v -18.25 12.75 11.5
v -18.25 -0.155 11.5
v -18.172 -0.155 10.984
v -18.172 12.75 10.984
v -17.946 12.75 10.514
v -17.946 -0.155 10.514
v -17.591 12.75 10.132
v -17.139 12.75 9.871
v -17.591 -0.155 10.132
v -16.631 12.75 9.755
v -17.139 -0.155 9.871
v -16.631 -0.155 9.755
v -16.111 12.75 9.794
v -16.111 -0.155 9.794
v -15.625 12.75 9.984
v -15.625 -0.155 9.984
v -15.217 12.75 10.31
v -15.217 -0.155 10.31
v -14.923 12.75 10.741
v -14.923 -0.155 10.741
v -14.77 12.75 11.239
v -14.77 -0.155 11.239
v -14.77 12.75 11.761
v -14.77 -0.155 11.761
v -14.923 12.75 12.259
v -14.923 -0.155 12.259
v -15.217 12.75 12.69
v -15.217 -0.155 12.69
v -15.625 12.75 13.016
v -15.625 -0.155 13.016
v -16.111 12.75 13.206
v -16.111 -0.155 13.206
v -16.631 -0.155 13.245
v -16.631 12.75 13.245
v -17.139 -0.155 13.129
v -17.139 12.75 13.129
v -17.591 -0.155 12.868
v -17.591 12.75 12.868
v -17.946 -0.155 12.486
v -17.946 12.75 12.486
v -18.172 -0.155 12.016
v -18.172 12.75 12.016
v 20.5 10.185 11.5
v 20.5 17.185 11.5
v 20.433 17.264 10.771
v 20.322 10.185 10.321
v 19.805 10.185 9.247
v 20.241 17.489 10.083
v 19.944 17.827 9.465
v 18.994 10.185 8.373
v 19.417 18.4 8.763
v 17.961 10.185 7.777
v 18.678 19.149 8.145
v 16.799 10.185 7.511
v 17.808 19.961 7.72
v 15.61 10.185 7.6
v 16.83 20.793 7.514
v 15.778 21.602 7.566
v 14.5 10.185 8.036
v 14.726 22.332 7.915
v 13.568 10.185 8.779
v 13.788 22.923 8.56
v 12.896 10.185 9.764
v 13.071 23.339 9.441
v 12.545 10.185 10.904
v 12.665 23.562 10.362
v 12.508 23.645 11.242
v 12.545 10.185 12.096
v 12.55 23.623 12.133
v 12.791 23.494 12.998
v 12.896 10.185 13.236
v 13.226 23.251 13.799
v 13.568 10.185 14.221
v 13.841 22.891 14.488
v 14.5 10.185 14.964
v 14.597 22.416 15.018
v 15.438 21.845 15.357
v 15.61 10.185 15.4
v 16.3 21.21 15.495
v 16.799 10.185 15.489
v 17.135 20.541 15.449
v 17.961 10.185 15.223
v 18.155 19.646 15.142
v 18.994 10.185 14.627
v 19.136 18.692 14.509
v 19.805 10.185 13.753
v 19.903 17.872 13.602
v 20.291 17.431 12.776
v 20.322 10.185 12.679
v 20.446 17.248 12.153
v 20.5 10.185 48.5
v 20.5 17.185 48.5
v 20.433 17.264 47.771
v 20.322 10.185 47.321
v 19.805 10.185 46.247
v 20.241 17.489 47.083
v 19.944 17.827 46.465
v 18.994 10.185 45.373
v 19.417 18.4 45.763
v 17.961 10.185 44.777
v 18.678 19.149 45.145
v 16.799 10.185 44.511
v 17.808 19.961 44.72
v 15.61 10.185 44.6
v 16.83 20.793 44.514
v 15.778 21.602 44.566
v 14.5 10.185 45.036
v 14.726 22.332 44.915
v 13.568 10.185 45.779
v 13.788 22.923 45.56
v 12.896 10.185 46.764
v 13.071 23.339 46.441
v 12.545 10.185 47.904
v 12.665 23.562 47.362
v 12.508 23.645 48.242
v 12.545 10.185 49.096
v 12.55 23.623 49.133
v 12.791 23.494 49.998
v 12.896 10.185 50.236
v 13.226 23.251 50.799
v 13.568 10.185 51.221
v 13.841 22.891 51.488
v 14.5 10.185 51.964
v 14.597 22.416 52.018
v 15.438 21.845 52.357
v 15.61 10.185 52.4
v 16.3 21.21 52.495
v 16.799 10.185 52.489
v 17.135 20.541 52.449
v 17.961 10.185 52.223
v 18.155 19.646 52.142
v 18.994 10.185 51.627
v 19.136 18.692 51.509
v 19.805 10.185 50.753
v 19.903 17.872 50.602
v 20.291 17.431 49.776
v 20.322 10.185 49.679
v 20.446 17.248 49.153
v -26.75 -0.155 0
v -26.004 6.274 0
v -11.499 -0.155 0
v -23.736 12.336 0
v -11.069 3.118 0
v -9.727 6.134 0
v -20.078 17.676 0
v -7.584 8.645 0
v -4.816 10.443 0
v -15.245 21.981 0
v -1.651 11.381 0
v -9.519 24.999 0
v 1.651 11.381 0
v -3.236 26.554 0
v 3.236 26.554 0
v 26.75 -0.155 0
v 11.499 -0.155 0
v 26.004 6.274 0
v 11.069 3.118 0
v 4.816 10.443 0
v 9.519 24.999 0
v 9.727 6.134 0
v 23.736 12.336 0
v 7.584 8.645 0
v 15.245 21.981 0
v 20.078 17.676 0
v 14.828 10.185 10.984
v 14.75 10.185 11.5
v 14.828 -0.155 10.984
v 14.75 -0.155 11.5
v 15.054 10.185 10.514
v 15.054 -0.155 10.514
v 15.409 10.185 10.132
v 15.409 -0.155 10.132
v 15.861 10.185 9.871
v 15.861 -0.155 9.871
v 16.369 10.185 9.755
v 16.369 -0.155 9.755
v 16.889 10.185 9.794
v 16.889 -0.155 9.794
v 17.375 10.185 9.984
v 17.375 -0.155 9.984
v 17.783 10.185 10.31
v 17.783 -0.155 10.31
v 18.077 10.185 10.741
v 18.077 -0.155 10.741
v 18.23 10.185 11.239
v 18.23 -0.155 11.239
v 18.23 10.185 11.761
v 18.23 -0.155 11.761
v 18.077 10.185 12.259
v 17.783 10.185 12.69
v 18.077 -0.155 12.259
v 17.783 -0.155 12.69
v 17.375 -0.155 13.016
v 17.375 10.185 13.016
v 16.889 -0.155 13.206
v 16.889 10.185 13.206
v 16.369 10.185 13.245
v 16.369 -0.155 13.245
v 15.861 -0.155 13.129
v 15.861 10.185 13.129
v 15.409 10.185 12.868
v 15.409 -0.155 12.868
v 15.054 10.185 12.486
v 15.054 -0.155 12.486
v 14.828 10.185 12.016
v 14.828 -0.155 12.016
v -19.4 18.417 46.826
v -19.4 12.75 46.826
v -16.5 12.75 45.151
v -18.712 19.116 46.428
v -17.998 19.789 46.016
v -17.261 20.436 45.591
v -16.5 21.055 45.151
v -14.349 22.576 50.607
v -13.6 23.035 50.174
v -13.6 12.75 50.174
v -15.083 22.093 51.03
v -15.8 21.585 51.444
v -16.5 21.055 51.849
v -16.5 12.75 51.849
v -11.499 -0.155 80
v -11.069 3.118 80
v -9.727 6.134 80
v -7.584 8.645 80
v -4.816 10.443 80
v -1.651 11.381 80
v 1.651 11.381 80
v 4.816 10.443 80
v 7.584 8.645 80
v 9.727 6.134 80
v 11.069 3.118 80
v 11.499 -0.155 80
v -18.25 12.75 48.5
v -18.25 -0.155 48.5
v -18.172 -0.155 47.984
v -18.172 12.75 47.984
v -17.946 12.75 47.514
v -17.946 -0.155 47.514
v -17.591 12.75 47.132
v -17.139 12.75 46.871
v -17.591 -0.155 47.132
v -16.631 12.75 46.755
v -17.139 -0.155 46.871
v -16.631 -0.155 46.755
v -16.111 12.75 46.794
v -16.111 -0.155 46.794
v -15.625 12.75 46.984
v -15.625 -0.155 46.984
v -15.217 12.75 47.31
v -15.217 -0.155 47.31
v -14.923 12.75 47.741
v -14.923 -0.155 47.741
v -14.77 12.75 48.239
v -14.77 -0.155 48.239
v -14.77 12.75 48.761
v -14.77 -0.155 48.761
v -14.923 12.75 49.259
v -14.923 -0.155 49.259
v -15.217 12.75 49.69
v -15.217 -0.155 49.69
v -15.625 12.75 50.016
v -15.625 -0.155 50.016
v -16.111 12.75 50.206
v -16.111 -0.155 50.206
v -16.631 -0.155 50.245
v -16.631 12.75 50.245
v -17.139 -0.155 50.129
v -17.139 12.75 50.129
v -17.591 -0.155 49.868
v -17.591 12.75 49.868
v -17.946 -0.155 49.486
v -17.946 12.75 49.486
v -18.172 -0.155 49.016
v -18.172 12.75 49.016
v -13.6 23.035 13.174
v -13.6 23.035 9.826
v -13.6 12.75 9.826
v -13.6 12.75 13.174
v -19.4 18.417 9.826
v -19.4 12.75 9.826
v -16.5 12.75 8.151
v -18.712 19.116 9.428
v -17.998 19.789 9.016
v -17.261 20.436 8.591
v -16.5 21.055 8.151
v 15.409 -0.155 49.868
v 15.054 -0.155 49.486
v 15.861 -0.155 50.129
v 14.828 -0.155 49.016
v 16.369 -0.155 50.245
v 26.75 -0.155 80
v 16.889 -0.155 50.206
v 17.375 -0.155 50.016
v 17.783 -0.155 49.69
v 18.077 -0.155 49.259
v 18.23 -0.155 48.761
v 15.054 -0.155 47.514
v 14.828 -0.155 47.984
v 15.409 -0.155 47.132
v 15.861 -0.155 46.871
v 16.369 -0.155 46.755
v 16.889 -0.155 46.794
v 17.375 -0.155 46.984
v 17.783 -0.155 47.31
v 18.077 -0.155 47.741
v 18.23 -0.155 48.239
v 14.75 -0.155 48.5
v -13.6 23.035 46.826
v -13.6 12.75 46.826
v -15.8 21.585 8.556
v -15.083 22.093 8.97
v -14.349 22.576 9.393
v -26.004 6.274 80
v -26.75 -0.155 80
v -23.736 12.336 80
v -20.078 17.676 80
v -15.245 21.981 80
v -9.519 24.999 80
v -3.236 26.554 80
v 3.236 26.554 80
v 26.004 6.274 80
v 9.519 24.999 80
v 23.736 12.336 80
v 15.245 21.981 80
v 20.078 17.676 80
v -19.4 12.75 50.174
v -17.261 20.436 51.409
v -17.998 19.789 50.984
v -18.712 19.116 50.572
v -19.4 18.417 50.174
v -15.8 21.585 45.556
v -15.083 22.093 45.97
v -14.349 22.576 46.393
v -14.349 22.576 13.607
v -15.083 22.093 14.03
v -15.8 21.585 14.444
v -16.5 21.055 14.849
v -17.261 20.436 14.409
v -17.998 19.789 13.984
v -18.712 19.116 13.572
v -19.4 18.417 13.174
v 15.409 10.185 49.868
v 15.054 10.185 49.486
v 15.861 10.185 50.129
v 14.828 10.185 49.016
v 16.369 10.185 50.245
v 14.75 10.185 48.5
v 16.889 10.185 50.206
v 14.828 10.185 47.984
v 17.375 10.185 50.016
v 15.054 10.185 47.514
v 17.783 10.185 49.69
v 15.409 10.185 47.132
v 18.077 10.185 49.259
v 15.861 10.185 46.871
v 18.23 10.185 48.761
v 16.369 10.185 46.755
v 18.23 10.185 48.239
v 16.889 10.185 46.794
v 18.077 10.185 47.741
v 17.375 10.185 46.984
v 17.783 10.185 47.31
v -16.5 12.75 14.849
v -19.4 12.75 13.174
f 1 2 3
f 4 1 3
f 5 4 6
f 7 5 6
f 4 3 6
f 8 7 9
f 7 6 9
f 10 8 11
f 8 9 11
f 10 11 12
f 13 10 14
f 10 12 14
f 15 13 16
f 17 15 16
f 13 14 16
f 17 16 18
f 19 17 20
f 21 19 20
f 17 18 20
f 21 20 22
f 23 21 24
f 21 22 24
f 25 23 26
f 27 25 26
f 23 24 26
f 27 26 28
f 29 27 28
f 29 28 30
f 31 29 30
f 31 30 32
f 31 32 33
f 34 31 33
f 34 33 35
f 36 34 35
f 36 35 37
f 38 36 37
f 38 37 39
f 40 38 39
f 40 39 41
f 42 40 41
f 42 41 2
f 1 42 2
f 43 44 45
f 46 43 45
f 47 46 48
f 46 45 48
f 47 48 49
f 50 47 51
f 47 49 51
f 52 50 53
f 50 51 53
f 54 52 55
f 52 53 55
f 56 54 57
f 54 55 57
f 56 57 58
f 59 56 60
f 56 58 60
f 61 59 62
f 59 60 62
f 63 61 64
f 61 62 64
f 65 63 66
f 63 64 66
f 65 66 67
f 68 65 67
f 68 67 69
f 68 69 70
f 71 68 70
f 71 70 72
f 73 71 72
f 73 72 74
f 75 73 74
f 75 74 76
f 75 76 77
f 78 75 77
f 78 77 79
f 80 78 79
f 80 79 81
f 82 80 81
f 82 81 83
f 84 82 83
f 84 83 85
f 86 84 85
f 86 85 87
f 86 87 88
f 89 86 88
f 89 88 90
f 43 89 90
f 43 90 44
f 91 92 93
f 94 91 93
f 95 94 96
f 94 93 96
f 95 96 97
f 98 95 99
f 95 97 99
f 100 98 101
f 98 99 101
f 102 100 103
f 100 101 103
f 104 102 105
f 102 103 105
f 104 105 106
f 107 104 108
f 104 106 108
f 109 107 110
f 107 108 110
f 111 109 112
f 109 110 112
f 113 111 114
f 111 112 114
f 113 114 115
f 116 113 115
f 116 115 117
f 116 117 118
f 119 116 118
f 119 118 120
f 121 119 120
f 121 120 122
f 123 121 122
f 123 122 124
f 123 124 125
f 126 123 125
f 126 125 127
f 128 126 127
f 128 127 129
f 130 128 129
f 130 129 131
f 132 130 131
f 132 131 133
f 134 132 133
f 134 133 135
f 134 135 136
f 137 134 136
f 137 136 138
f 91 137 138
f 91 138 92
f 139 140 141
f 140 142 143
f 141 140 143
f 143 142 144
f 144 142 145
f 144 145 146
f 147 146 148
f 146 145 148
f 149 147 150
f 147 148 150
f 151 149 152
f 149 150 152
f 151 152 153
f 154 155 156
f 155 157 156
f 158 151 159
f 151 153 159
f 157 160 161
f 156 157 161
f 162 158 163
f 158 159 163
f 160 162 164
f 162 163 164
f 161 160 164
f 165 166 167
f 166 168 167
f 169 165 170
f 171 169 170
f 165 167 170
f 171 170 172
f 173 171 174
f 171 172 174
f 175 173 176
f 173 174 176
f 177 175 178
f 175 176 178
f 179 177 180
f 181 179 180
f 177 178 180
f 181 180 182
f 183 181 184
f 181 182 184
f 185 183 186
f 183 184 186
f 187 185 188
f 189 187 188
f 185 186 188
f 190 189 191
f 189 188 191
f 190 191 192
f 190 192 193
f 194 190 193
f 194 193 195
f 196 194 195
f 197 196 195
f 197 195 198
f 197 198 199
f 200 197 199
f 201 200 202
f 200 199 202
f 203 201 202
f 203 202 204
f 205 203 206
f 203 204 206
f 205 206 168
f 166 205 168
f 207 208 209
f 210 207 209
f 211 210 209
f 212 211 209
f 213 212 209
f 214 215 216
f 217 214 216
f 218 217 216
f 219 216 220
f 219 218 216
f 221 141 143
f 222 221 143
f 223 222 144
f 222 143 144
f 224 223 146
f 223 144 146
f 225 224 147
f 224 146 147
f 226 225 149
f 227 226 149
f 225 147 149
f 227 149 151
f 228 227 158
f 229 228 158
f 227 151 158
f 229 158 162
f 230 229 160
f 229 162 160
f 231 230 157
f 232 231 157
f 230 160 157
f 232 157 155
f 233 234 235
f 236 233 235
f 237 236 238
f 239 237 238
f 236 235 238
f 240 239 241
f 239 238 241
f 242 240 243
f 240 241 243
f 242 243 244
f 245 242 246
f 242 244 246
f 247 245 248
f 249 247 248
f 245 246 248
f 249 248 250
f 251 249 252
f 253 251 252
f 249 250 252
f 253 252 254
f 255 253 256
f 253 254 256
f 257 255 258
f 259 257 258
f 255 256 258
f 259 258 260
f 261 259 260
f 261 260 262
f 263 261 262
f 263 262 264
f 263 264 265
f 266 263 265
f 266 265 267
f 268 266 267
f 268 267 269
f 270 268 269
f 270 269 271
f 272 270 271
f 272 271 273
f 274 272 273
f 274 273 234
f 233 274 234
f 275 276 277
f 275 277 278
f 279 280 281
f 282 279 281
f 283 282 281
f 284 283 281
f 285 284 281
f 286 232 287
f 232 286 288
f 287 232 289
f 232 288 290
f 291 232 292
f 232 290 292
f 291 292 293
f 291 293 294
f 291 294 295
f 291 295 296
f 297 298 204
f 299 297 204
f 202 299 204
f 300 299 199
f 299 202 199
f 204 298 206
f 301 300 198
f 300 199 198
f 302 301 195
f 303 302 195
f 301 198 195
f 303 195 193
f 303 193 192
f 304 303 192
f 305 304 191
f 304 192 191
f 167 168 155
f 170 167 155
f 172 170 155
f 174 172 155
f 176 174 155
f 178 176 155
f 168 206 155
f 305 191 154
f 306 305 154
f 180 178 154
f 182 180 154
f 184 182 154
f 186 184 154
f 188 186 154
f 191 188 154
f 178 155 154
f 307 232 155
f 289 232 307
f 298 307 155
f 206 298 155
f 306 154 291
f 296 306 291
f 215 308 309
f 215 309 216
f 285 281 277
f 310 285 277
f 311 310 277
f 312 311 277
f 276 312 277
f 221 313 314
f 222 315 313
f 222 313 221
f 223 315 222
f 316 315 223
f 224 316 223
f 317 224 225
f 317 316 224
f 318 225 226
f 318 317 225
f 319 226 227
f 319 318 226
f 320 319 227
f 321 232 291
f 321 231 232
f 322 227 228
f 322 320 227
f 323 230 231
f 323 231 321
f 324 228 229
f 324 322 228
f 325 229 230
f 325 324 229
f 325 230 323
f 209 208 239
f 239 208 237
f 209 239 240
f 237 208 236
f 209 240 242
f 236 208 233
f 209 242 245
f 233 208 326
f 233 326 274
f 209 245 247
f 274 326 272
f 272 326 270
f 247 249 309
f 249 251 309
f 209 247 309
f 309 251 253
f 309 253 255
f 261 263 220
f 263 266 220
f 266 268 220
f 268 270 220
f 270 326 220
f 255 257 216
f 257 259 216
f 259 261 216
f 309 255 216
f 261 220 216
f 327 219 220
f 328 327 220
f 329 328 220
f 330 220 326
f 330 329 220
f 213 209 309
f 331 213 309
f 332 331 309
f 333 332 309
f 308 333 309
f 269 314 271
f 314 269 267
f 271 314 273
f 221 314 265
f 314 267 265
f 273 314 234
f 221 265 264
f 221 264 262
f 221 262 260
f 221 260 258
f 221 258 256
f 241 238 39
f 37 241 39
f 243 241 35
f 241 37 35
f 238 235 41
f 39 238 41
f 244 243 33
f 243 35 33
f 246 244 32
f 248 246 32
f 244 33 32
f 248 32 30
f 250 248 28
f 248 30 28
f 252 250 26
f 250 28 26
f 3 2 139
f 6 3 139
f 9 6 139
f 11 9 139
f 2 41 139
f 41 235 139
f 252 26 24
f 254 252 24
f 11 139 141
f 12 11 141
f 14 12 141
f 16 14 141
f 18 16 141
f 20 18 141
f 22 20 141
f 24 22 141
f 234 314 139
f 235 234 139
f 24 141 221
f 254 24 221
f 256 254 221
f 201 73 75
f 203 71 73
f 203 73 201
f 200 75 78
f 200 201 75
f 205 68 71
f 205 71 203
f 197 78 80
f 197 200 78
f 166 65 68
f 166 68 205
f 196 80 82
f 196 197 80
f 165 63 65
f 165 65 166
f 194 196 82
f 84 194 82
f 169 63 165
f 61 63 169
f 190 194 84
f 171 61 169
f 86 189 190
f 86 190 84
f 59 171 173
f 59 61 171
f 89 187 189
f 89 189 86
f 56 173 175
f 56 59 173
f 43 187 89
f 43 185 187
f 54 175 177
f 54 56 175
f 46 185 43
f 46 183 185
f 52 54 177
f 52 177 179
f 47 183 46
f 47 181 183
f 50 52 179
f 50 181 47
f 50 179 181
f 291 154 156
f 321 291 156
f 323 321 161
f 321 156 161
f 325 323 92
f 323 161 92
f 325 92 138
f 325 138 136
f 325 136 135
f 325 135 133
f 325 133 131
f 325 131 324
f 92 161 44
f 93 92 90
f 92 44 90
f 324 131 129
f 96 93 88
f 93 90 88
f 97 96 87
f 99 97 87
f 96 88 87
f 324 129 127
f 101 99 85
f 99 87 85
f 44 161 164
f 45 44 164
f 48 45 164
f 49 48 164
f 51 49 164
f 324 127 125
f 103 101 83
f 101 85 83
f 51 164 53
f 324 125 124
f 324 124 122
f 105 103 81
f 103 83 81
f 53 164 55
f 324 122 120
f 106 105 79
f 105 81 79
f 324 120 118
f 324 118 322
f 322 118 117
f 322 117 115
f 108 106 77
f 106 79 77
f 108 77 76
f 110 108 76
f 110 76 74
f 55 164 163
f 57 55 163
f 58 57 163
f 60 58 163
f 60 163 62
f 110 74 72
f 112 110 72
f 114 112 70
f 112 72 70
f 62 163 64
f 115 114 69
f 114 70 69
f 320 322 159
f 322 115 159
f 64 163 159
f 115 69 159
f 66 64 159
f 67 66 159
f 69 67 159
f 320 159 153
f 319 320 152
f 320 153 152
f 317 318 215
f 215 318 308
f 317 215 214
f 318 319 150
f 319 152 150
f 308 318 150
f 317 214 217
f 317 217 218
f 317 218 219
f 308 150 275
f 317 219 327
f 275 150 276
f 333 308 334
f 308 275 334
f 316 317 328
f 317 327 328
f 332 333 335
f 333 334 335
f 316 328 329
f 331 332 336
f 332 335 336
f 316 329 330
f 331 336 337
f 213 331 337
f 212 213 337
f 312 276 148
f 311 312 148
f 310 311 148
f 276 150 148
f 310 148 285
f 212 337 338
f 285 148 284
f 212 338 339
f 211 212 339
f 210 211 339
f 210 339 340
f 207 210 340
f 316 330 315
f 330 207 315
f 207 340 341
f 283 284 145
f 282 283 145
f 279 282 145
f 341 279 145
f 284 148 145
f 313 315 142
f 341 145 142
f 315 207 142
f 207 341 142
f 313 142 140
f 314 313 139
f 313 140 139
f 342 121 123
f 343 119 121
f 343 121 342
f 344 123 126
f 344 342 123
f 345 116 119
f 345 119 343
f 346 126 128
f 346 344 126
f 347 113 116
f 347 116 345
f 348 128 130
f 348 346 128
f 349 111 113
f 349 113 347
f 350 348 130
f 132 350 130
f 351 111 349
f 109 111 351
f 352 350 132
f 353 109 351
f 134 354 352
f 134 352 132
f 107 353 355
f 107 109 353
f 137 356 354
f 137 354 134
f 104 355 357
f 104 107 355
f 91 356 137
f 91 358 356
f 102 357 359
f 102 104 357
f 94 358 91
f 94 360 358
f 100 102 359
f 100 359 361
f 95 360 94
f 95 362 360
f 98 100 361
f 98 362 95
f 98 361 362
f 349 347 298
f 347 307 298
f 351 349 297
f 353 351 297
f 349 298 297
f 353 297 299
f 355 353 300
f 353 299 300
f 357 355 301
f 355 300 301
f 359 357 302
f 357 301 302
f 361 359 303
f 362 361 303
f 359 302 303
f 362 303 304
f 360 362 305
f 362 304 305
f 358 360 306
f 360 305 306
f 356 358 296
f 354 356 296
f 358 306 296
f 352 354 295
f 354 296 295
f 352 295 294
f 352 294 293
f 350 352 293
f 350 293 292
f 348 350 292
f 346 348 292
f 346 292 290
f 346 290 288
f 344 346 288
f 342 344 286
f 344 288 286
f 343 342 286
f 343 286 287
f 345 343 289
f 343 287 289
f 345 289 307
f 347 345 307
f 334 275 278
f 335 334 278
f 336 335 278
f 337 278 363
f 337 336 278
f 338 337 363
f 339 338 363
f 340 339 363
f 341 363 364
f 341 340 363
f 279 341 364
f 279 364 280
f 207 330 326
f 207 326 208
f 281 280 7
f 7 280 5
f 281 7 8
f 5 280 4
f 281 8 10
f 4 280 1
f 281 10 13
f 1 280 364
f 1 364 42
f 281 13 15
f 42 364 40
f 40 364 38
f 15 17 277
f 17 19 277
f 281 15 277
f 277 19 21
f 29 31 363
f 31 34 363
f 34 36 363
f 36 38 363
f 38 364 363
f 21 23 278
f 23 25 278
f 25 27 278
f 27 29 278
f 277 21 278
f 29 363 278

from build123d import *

# Parameters (mm, degrees)
F1_DEPTH       = 80
F4_D           = 3.5
F4_START       = 9.5653412
F4_CBORE_D     = 8
F4_CBORE_DEPTH = 7
F5_D           = 3.5
F6_DEPTH       = 25
F7_DEPTH       = 14


with BuildPart() as f1:
    # F0 (on Top) → F1 (new body)
    with BuildSketch(Plane.XY):
        with BuildLine():
            Line((11.4989534177, -0.1551460505), (26.7495500841, -0.1551460505))
            ThreePointArc((26.7495500841, -0.1551460505), (0, 26.75), (-26.7495500841, -0.1551460505))
            Line((-26.7495500841, -0.1551460505), (-11.4989534177, -0.1551460505))
            ThreePointArc((-11.4989534177, -0.1551460505), (0, 11.5), (11.4989534177, -0.1551460505))
        make_face()
    extrude(amount=F1_DEPTH)

    # F4 (through all)
    # its depths count from where the whole tool has entered the part; down to there all is cleared
    with Locations(Plane(origin=(0, 26.75, 0), x_dir=(1, 0, 0), z_dir=(0, 1, 0)).offset(-F4_START)):
        with Locations((16.5, -48.5), (16.5, -11.5)):
            CounterBoreHole(F4_D / 2, F4_CBORE_D / 2, F4_CBORE_DEPTH)

    # F5 (through all)
    with Locations(Plane(origin=(0, 26.75, 0), x_dir=(1, 0, 0), z_dir=(0, 1, 0))):
        with Locations((-16.5, -48.5), (-16.5, -11.5)):
            Hole(F5_D / 2)

    # F3 (on offset) → F6 (cut)
    with BuildSketch(Plane.XZ.offset(-26.75)):
        Polygon((-16.5, 45.1513684387), (-13.6, 46.8256842194), (-13.6, 50.1743157806), (-16.5, 51.8486315613), (-19.4, 50.1743157806), (-19.4, 46.8256842194), align=None)
    extrude(amount=-F6_DEPTH, mode=Mode.SUBTRACT)

    # F3 (on offset) → F7 (cut)
    with BuildSketch(Plane.XZ.offset(-26.75)):
        Polygon((-16.5, 45.1513684387), (-13.6, 46.8256842194), (-13.6, 50.1743157806), (-16.5, 51.8486315613), (-19.4, 50.1743157806), (-19.4, 46.8256842194), align=None)
        Polygon((-16.5, 8.1513684387), (-13.6, 9.8256842194), (-13.6, 13.1743157806), (-16.5, 14.8486315613), (-19.4, 13.1743157806), (-19.4, 9.8256842194), align=None)
    extrude(amount=F7_DEPTH, mode=Mode.SUBTRACT)


solid = f1.part
